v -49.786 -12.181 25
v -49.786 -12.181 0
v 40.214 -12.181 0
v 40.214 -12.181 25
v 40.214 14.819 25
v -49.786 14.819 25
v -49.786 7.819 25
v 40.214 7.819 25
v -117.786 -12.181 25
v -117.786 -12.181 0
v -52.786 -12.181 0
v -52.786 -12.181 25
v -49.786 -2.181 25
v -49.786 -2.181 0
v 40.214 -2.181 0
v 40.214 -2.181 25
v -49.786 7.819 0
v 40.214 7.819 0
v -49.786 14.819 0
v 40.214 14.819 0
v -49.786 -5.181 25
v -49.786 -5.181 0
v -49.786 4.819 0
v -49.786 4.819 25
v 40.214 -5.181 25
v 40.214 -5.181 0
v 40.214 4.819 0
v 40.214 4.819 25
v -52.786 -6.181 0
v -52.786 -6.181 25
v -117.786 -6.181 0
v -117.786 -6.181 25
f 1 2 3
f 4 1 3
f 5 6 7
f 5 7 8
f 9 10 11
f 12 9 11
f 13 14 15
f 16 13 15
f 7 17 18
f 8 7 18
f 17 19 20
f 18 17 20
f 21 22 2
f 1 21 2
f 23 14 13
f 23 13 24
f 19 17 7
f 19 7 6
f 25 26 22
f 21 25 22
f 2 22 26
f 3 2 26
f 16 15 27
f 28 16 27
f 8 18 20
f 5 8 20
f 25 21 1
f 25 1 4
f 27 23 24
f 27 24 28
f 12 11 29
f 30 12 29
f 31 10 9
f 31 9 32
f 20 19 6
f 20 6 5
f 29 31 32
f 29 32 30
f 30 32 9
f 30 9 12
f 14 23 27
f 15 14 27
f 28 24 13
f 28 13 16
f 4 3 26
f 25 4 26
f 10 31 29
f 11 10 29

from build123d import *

# Parameters (mm, degrees)
F0_W     = 90
F0_H     = 7
F1_DEPTH = 25
F0_W_2   = 65
F0_H_2   = 6
F2_DEPTH = 25


# Not quite as in the source:
# - a feature names something its author has since deleted; it is built from what else it names


with BuildPart() as f1:
    # F0 (on Top) → F1 (new body)
    with BuildSketch(Plane.XY):
        with Locations((-4.7864606604, 1.3194340005)):
            Rectangle(F0_W, F0_H)
    extrude(amount=F1_DEPTH)


with BuildPart() as f1b:
    # F0 (on Top) → F1, piece 2 (new body)
    with BuildSketch(Plane.XY):
        Polygon((40.2135393396, -5.1805659995), (-49.7864606604, -5.1805659995), (-49.7864606604, -12.1805659995), (15.2135393396, -12.1805659995), (40.2135393396, -12.1805659995), align=None)
    extrude(amount=F1_DEPTH)

    # F0 (on Top) → F2, piece 2 (join)
    with BuildSketch(Plane.XY):
        Polygon((40.2135393396, -5.1805659995), (-49.7864606604, -5.1805659995), (-49.7864606604, -12.1805659995), (15.2135393396, -12.1805659995), (40.2135393396, -12.1805659995), align=None)
    extrude(amount=F2_DEPTH)


with BuildPart() as f1c:
    # F0 (on Top) → F1, piece 3 (new body)
    with BuildSketch(Plane.XY):
        with Locations((-85.2864606604, -9.1805659995)):
            Rectangle(F0_W_2, F0_H_2)
    extrude(amount=F1_DEPTH)


with BuildPart() as f2:
    # F0 (on Top) → F2 (new body)
    with BuildSketch(Plane.XY):
        with Locations((-4.7864606604, 11.3194340005)):
            Rectangle(F0_W, F0_H)
    extrude(amount=F2_DEPTH)


solid = Compound([f1.part, f1b.part, f1c.part, f2.part])
